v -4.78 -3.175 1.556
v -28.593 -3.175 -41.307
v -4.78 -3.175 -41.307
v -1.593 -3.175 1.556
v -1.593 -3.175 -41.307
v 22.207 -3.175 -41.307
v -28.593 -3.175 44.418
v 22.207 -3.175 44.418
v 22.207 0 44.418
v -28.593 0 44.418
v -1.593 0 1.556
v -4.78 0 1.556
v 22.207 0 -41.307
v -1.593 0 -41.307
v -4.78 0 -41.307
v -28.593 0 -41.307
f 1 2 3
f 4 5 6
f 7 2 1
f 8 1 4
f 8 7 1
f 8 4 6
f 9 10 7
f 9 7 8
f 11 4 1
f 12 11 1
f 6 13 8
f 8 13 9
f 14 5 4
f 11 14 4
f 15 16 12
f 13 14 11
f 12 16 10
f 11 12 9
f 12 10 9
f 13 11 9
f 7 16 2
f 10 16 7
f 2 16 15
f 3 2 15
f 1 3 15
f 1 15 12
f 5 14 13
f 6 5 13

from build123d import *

# Parameters (mm, degrees)
F0_W     = 50.8
F0_H     = 85.725
F1_DEPTH = 3.175
F2_W     = 1.5875
F2_H     = 42.8625
F2_W_2   = 1.6002
F3_DEPTH = 3.176


with BuildPart() as f1:
    # F0 (on Front) → F1 (new body)
    with BuildSketch(Plane.XZ):
        with Locations((-3.192704, 1.555809)):
            Rectangle(F0_W, F0_H)
    extrude(amount=F1_DEPTH)

    # F2 (on face) → F3 (cut, through all)
    with BuildSketch(Plane.XZ.offset(3.175)):
        with Locations((-3.986454, -19.875441)):
            Rectangle(F2_W, F2_H)
        with Locations((-2.392604, -19.875441)):
            Rectangle(F2_W_2, F2_H)
    extrude(amount=-F3_DEPTH, mode=Mode.SUBTRACT)


solid = f1.part
